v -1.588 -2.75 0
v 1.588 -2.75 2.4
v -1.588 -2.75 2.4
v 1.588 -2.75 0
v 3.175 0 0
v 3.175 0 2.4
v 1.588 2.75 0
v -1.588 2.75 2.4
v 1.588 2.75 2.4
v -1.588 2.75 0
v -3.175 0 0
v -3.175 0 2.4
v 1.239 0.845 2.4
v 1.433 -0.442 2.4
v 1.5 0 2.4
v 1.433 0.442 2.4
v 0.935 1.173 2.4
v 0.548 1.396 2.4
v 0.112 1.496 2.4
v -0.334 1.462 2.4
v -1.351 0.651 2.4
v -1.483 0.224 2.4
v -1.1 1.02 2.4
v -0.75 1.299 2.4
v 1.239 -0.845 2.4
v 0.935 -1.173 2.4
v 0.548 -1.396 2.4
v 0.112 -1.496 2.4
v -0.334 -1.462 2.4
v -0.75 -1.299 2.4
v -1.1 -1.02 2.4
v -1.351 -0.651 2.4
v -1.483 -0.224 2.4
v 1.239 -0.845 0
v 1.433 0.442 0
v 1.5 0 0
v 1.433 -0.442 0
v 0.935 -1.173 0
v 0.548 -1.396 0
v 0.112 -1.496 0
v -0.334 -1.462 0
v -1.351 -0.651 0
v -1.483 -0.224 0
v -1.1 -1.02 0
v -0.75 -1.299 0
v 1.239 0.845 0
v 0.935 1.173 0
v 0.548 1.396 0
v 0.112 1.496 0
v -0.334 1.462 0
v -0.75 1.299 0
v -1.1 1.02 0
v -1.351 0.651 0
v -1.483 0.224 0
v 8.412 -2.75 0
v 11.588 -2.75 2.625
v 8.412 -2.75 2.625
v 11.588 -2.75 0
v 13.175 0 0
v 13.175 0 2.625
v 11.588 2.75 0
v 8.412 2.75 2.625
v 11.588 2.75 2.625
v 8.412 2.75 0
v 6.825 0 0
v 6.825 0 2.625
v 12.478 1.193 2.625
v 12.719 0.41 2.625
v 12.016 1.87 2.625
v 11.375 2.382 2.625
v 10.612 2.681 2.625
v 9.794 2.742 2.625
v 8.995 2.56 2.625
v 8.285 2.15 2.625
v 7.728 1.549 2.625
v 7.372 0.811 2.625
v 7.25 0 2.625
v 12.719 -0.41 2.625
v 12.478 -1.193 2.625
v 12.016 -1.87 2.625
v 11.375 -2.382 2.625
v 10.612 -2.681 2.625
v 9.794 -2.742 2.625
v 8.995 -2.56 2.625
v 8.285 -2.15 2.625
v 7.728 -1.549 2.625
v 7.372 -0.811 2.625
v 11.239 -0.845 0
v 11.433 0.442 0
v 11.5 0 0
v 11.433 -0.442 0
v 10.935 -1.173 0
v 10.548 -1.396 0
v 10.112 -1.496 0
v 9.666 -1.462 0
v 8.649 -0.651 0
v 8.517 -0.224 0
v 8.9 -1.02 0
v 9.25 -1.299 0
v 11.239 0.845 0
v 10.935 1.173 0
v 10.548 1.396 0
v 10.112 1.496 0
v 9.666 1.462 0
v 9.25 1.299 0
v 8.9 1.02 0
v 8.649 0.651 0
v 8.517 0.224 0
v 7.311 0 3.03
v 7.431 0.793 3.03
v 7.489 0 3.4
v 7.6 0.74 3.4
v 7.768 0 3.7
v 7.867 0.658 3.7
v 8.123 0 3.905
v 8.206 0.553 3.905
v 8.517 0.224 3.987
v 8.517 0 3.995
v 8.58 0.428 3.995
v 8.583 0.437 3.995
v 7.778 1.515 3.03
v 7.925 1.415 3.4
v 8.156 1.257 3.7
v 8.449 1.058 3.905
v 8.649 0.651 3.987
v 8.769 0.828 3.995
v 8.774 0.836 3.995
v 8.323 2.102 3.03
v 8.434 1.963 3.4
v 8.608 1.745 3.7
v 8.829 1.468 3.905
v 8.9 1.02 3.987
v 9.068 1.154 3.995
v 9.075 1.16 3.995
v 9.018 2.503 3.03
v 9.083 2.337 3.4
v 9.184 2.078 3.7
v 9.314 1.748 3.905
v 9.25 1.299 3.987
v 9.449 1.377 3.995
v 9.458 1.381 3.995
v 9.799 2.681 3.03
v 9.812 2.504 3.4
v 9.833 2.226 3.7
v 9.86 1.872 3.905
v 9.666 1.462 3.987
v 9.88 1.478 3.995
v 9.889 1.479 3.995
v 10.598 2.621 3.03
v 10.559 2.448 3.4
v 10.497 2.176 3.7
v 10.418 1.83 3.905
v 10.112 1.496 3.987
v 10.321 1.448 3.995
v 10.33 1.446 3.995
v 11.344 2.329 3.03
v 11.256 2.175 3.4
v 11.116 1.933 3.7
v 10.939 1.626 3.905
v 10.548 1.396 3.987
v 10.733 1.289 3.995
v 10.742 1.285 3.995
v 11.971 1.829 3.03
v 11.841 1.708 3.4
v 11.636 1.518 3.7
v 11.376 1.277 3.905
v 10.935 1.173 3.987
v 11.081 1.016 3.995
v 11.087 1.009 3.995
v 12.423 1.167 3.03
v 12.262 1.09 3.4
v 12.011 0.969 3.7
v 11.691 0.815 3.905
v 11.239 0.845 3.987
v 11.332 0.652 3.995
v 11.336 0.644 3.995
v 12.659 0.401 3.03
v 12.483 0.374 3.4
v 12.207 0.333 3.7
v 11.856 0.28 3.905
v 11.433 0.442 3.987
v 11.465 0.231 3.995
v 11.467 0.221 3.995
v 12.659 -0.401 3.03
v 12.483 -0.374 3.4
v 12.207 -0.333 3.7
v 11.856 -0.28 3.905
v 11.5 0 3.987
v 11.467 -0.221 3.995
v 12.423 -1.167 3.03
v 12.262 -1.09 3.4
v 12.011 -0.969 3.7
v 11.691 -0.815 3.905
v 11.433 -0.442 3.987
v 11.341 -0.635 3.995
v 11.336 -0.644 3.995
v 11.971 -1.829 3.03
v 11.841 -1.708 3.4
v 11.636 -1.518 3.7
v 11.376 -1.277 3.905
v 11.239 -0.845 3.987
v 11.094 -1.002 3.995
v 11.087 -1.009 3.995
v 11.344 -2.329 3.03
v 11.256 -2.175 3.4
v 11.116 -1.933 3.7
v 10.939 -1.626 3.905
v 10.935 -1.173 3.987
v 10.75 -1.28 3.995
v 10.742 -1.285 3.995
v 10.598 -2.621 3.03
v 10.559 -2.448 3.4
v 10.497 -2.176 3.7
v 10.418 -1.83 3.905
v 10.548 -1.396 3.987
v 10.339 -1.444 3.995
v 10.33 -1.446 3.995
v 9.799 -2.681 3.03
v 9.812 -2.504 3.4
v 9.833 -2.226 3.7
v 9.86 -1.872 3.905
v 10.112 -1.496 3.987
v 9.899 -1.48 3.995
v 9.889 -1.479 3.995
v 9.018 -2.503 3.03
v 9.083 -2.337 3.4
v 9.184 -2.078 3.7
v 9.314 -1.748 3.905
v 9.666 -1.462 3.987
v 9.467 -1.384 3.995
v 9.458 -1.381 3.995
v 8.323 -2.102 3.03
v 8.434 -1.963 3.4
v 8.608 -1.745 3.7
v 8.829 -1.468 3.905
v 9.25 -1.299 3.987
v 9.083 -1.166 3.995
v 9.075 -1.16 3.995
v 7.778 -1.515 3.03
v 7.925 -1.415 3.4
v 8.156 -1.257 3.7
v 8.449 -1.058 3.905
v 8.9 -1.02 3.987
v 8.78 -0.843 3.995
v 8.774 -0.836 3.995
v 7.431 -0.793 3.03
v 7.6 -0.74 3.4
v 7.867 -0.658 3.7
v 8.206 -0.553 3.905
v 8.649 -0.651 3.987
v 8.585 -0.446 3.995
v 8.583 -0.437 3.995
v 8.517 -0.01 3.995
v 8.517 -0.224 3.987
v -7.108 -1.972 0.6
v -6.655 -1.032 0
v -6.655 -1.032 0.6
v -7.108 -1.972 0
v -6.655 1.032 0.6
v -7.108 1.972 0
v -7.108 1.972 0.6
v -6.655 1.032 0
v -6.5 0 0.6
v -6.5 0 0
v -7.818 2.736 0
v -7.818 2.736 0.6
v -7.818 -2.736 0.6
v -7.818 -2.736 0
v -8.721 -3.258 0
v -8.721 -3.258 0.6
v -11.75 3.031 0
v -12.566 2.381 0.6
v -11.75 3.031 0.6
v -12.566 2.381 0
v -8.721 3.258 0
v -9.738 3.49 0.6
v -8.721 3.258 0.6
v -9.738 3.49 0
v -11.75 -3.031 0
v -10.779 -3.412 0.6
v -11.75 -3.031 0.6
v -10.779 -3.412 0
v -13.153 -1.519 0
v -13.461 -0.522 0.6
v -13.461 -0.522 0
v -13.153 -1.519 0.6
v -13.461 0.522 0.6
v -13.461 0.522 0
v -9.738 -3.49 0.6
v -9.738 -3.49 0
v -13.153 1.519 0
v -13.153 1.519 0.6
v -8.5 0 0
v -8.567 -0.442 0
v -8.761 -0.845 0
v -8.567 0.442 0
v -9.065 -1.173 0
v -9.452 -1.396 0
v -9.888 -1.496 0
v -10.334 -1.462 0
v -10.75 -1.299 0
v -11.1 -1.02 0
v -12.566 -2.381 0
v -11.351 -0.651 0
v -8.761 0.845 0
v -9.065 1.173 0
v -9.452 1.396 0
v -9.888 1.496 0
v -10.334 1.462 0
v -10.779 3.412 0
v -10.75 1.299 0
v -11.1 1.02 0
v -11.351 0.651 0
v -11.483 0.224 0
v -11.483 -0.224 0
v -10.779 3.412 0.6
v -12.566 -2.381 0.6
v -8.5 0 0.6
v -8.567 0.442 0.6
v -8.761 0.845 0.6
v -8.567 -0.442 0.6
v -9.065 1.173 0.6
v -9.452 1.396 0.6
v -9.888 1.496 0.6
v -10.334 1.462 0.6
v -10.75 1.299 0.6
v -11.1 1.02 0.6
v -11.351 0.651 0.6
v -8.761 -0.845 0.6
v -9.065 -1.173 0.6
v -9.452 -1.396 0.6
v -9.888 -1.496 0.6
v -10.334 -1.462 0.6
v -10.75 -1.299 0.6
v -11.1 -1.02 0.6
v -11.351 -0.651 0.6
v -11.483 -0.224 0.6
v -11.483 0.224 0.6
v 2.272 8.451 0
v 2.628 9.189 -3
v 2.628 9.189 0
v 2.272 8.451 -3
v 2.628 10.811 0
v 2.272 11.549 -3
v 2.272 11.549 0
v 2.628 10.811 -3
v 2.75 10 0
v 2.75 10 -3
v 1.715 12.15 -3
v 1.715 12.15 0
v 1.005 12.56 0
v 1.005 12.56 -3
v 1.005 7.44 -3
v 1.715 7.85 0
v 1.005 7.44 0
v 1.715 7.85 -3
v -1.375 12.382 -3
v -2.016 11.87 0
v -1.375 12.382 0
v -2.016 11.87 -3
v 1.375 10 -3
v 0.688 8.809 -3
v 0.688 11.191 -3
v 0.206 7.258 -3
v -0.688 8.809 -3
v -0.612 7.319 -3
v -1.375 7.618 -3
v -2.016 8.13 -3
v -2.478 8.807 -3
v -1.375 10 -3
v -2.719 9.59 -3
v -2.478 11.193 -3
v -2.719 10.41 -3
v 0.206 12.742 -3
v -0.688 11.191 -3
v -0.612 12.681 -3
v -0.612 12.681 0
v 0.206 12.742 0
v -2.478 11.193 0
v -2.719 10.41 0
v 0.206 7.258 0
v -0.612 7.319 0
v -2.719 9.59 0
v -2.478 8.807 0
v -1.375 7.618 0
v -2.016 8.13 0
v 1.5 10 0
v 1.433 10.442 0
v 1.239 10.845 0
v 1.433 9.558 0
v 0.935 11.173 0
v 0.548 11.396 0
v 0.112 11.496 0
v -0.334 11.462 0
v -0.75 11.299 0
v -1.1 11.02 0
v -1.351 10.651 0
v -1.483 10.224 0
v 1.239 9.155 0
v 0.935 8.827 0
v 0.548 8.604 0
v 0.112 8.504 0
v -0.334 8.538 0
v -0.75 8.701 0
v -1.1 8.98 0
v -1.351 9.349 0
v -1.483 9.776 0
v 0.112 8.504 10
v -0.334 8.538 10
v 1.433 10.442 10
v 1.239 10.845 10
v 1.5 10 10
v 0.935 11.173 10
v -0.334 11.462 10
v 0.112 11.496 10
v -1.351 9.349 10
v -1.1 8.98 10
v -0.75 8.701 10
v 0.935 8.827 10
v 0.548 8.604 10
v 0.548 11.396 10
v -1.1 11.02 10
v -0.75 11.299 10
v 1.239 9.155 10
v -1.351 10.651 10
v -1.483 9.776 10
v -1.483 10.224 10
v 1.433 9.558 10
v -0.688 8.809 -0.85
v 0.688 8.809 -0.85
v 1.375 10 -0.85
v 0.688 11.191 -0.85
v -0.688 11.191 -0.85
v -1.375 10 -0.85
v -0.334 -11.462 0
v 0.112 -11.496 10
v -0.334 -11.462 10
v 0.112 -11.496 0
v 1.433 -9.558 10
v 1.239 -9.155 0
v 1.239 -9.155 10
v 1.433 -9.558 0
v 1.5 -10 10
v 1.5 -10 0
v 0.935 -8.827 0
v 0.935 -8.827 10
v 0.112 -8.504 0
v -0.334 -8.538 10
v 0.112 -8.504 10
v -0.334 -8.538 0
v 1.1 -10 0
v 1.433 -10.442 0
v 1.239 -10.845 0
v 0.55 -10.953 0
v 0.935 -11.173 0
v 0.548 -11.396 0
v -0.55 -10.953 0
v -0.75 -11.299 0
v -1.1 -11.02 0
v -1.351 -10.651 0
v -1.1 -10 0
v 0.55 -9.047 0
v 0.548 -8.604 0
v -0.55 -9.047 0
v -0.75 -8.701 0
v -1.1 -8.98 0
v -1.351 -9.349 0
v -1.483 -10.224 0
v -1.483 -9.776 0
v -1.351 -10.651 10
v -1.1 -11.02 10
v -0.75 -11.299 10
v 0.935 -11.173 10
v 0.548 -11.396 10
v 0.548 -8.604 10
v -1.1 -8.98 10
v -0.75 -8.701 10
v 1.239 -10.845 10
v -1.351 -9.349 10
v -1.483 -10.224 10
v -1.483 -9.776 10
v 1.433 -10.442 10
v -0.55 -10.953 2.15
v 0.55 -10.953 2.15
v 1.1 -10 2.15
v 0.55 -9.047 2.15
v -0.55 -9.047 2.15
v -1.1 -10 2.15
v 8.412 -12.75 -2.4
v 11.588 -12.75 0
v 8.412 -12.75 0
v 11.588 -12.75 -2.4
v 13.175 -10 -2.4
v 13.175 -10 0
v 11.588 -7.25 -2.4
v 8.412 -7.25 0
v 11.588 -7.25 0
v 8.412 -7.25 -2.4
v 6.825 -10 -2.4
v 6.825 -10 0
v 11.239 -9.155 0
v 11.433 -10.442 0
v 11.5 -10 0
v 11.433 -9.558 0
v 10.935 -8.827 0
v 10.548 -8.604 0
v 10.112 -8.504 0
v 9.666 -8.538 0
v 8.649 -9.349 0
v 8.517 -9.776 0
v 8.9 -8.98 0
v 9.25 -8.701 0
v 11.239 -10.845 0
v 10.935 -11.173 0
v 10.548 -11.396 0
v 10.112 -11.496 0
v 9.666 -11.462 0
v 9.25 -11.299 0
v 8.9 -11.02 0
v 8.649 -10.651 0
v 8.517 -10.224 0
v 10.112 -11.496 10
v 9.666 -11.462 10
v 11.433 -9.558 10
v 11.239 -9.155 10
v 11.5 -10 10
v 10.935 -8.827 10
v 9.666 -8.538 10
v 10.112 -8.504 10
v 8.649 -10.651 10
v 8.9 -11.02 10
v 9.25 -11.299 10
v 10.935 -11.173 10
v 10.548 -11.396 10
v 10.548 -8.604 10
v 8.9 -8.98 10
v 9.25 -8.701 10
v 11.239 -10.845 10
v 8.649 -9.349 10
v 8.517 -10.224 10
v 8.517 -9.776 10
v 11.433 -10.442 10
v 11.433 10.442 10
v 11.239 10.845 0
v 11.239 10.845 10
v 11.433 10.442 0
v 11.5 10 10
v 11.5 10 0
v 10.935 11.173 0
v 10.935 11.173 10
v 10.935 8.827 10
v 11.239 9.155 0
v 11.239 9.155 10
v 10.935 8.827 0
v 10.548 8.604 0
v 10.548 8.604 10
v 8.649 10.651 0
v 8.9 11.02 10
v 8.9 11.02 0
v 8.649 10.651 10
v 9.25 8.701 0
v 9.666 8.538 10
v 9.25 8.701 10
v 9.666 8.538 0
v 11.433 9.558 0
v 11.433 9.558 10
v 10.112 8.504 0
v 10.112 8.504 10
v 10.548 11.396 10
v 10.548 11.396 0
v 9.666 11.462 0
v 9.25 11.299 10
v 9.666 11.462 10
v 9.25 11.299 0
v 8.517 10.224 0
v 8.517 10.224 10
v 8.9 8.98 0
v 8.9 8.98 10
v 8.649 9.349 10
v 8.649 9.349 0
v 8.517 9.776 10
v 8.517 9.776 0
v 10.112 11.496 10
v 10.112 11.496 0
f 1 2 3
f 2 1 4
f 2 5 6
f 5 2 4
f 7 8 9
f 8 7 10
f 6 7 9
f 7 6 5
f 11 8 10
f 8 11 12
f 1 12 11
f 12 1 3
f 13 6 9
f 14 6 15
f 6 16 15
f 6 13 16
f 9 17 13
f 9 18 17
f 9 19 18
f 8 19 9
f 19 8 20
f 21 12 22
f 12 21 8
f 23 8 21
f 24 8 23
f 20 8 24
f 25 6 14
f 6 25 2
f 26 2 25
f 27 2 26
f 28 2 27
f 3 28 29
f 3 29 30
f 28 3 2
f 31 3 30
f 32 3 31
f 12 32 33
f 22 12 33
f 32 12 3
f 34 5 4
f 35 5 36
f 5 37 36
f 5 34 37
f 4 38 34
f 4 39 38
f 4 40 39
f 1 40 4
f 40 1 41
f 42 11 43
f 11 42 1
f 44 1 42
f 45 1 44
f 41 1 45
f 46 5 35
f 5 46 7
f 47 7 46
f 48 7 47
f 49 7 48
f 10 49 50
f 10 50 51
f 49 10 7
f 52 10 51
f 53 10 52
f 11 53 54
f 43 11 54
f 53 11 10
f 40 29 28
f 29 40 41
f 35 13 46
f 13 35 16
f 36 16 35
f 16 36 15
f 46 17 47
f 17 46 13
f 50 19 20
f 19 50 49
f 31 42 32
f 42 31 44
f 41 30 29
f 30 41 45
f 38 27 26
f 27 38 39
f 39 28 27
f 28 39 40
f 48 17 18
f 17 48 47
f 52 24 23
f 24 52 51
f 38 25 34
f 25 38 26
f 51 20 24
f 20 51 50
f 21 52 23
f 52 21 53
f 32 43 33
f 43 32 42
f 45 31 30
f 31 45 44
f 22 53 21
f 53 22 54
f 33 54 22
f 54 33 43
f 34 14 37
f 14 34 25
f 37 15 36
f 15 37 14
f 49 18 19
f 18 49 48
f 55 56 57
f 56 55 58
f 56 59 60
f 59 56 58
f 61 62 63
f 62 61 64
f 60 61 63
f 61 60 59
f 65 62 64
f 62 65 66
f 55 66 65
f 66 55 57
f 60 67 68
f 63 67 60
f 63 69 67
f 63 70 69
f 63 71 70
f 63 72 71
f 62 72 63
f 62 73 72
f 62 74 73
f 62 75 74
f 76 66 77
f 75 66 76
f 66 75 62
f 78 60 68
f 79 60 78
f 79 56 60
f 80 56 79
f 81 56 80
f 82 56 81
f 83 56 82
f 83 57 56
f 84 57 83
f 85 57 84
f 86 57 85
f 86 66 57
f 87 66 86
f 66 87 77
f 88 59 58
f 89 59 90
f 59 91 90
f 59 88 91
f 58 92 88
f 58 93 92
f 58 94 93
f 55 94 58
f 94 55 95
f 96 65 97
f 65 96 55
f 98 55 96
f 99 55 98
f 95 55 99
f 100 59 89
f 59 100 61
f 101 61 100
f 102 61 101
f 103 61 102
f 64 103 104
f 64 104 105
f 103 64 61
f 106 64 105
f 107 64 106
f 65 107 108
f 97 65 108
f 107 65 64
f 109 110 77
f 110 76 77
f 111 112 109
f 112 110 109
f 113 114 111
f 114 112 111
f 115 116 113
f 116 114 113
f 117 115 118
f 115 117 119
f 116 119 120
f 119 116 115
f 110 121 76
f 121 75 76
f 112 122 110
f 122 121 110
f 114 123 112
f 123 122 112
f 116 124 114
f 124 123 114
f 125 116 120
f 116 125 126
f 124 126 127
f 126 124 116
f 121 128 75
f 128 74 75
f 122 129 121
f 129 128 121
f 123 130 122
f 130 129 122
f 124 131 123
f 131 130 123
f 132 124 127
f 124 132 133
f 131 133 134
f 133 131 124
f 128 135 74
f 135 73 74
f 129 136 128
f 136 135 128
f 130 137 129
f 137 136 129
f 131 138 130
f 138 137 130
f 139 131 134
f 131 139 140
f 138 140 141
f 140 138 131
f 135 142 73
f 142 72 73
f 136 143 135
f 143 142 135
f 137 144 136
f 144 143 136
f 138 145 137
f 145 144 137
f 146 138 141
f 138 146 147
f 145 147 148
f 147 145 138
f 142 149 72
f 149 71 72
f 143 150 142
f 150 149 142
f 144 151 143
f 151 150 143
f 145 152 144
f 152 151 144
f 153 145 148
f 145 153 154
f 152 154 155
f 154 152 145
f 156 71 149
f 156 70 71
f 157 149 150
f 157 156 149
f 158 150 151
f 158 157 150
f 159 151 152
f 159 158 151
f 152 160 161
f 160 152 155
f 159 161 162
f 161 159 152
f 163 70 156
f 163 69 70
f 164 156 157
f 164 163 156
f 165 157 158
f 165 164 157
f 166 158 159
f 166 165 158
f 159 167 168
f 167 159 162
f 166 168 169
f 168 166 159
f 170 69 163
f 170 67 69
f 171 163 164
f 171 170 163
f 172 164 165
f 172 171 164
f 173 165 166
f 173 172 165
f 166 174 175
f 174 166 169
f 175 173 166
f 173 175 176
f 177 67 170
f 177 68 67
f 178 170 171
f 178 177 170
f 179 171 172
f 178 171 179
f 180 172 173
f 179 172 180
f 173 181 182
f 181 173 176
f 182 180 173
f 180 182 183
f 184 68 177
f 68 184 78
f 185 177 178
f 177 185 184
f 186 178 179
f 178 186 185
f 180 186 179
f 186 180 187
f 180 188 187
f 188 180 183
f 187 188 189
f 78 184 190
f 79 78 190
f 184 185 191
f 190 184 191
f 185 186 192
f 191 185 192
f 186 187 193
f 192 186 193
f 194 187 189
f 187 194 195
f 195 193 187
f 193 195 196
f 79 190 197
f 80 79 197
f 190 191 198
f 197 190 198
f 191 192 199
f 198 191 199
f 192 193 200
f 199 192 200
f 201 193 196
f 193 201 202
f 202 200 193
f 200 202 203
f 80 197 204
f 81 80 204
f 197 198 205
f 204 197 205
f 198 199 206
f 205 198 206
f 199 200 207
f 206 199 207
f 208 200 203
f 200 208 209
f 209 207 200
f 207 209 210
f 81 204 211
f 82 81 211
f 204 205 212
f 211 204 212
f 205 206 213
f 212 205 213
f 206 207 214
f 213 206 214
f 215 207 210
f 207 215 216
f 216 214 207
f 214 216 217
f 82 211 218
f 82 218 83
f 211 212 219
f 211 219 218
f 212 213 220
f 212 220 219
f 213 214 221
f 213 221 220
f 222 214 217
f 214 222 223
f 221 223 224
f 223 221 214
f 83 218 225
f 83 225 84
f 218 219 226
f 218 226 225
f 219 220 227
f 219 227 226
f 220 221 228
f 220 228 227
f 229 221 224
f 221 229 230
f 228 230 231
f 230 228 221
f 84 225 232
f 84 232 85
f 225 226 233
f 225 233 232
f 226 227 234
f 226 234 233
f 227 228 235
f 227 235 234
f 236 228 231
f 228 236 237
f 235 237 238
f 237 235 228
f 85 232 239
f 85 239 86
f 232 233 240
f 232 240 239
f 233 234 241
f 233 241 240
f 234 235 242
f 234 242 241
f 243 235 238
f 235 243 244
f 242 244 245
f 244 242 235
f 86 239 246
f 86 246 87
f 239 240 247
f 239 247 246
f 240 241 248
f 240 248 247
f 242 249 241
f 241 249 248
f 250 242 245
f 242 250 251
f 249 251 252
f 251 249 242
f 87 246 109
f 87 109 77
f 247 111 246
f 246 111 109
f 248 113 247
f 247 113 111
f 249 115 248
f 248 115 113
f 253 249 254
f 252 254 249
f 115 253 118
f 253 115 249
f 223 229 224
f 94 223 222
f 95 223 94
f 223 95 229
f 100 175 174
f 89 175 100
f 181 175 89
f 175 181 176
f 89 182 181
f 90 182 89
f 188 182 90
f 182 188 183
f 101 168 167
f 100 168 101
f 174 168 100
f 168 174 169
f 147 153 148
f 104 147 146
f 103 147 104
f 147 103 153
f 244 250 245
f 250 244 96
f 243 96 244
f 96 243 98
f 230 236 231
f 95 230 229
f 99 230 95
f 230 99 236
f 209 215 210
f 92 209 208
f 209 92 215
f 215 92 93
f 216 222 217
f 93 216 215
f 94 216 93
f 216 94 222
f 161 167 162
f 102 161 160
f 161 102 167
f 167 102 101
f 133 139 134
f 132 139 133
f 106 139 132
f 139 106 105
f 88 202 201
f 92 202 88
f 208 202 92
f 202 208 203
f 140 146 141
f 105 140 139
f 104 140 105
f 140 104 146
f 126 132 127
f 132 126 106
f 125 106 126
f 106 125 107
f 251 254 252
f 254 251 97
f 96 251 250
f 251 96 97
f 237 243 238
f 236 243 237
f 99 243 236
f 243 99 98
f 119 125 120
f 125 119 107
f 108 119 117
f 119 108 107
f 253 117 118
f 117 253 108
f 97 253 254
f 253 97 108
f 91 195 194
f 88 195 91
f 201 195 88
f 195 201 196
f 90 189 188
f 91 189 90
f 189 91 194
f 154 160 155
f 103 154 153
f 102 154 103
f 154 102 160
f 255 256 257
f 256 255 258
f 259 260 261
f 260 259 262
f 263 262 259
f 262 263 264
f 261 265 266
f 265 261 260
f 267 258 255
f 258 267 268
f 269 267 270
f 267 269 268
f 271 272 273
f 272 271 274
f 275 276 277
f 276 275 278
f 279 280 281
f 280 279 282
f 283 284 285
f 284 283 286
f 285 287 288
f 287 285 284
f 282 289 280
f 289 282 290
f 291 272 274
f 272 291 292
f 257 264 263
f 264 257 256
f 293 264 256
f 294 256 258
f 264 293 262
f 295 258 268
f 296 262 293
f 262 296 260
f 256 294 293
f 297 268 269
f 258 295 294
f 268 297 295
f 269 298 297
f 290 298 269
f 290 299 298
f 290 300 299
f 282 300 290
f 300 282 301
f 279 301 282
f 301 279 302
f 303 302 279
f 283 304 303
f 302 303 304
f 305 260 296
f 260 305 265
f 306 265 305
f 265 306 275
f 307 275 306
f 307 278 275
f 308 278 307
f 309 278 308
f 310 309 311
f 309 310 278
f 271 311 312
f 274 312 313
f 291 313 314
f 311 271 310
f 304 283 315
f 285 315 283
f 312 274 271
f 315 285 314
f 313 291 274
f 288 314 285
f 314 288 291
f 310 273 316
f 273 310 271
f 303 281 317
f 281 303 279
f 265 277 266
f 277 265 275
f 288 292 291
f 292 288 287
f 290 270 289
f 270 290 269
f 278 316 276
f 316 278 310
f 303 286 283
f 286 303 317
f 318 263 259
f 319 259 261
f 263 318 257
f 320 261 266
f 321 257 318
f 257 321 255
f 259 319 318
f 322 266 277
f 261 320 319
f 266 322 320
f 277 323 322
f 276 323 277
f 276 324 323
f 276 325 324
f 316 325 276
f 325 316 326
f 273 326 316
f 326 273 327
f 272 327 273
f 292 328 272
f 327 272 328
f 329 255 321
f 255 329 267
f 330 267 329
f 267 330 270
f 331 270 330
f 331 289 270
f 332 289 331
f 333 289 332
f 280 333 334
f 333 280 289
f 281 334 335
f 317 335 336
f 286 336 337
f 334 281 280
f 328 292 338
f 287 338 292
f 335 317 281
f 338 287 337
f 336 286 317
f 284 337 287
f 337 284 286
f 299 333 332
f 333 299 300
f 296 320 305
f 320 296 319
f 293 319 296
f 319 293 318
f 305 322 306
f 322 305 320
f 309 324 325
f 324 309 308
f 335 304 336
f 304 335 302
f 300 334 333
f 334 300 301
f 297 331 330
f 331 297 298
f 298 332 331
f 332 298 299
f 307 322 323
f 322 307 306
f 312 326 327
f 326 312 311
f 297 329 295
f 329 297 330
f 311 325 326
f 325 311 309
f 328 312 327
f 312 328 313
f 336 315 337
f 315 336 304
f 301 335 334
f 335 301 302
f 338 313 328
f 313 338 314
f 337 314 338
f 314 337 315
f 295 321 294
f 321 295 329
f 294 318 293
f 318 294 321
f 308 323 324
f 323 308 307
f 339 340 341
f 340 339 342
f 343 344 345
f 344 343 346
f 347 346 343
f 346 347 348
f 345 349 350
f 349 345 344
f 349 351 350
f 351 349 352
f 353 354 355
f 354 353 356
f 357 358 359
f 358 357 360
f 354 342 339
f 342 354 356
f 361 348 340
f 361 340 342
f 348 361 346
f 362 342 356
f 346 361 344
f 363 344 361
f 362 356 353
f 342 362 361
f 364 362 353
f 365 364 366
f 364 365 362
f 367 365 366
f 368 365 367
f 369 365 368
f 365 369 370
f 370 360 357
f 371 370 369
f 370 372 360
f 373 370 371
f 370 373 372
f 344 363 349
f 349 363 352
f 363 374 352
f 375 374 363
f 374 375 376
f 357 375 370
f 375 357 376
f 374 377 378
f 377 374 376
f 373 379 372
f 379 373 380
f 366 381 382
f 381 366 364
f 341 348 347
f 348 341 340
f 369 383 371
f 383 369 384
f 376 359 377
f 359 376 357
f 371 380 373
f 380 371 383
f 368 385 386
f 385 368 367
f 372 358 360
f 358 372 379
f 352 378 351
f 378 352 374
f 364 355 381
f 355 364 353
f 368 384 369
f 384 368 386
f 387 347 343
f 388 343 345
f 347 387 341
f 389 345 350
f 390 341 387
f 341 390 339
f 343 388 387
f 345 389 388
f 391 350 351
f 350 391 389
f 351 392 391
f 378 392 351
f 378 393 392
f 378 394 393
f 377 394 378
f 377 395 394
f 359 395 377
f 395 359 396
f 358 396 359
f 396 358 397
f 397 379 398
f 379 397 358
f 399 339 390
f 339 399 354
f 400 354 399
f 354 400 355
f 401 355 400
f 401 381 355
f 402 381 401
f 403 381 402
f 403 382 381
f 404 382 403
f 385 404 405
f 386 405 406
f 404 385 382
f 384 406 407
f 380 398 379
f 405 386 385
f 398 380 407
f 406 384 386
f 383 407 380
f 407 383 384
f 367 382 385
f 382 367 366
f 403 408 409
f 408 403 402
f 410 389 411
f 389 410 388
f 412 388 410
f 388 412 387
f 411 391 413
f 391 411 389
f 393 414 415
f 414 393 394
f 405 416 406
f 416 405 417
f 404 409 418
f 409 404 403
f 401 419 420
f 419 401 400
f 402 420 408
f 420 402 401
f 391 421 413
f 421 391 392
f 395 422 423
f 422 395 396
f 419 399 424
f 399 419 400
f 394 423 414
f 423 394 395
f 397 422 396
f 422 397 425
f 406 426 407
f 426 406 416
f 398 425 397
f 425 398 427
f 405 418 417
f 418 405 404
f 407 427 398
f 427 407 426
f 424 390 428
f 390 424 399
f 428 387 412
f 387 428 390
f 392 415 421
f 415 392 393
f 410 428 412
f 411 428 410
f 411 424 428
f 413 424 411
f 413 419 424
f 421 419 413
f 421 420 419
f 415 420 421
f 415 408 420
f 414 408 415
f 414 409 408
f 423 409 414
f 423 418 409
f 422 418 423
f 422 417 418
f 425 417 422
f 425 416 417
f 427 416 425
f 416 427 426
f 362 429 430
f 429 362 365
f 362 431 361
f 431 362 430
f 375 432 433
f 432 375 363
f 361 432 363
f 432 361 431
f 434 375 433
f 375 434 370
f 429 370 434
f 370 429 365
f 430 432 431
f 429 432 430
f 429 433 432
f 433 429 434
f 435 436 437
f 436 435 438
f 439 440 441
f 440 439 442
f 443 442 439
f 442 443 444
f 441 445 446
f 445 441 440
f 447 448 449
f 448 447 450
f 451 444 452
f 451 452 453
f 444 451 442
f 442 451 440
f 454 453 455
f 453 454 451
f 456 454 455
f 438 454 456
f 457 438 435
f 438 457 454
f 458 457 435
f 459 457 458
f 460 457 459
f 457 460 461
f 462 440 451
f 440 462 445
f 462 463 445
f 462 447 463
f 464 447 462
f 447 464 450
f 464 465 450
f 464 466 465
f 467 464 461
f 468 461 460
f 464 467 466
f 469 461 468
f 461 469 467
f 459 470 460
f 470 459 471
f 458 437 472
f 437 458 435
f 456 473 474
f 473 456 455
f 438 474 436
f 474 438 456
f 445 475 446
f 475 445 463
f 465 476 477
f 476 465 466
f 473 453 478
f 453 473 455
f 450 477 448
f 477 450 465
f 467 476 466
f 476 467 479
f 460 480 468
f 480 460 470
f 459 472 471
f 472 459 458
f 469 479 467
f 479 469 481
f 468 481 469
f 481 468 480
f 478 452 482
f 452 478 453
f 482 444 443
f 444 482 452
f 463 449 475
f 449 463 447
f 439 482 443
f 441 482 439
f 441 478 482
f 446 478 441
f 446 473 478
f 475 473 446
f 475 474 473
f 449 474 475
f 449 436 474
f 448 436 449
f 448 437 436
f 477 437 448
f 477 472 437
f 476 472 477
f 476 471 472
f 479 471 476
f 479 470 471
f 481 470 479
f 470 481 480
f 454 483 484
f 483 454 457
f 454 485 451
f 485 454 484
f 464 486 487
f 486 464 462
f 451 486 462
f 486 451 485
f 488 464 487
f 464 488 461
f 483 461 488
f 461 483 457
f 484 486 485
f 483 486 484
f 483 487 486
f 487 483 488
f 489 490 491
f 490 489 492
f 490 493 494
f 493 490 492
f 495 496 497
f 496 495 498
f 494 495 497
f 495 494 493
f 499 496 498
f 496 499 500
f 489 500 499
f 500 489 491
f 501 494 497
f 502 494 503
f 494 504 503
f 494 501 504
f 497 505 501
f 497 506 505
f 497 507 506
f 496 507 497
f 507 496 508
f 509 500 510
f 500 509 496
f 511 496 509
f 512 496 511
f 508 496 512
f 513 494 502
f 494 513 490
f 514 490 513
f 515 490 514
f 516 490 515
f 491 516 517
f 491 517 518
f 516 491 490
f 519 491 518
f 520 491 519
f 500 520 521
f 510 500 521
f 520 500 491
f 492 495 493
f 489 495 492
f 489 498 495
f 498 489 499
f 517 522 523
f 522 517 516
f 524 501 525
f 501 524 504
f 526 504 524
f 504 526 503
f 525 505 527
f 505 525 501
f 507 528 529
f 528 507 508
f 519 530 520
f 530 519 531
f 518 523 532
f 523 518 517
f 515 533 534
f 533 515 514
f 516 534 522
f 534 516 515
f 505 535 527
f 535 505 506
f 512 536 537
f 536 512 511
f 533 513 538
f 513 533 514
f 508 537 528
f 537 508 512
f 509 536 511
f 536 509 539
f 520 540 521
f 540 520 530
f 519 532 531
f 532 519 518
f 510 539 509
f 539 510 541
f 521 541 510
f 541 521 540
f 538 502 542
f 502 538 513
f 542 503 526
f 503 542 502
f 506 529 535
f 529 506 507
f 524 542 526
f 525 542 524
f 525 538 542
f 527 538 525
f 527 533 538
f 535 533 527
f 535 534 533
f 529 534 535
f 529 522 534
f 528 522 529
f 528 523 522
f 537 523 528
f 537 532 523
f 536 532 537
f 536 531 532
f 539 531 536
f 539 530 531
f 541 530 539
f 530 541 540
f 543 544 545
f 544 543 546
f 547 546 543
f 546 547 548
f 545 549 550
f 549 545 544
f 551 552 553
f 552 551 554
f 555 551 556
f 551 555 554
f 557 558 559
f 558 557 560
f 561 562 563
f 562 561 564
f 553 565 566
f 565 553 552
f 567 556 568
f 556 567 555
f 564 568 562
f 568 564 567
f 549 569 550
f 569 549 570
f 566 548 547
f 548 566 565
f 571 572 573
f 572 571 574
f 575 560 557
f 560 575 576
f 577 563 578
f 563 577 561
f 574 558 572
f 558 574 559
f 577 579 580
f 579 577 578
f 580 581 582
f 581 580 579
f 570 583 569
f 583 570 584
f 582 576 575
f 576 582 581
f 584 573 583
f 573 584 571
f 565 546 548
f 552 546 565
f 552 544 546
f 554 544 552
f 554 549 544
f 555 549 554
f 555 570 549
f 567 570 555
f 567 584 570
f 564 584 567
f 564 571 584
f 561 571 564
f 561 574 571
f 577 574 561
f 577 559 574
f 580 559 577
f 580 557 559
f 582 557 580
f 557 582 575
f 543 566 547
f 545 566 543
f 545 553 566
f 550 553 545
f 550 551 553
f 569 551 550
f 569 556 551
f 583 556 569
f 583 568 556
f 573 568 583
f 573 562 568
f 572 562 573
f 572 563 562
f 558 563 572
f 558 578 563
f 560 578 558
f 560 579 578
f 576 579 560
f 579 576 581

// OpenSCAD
// file: ../scad/materials.scad
module aluminium(){
	color([1,1,1]*0.95) for(i=[1:$children]) child(i-1);
}
module aluminum(){
	color([1,1,1]*0.95) for(i=[1:$children]) child(i-1);
}
module bzp(){
    color([0.7,0.7,1]) for(i=[1:$children]) child(i-1);
}
module stainless(){
    color([1,1,1]*0.6) for(i=[1:$children]) child(i-1);
}
module steel(){
    color([1,1,1]*0.5) for(i=[1:$children]) child(i-1);
}
module urethane(){
    color([166/255,119/255,73/255]) for(i=[1:$children]) child(i-1);
}
// file: ../scad/functions.scad
include <hardware_dims.scad>

// Assign Screw array
function getScrewDims(screw) = (screw=="M2") ? m2 : (screw=="M2.5") ? m2_5 : (screw=="M3") ? m3 : (screw=="M4") ? m4 : (screw=="M5") ? m5 : (screw=="M6") ? m6 : (screw=="M8") ? m8 : "error";

function get_screw_dims(screw) = getScrewDims(screw);

function getStepperDims(motor) = (motor=="NEMA8") ? nema8 : (motor=="NEMA11") ? nema11 : (motor=="NEMA14") ? nema14 : (motor=="NEMA17") ? nema17 : (motor=="Pololu 35x26") ? pololu35x26 :"error";

function get_stepper_dims(motor) = getStepperDims(motor);

function getElectronicsHoles(electronics) = (electronics=="Melzi") ? melzi : (electronics=="Mega") ? mega : (electronics=="Printrboard") ? printrboard : (electronics=="Sanguinololu") ? sanguinololu :"error";

function get_electronics_holes(electronics) = getElectronicsHoles(electronics);

function getExtruderGearDims(extruderGear) = (extruderGear=="Arcol8x5") ? arcol8x5 : (extruderGear=="Arcol11x8") ? arcol11x8 : (extruderGear=="Arcol11x5") ? arcol11x5 : (extruderGear=="Arcol13x8") ? arcol13x8 : "error";

function get_extruder_gear_dims(extruderGear) = getExtruderGearDims(extruderGear);

function get_drive_roller_dims(roller) = (roller == "A_7T_5MUR1405") ? A_7T_5MUR1405 : (roller == "A_7T_5MUR1606") ? A_7T_5MUR1606 : (roller == "A_7T_5MUR1905") ? A_7T_5MUR1905 : (roller == "A_7T_5MUR1906") ? A_7T_5MUR1906 : (roller == "A_7T_5MUR2206") ? A_7T_5MUR2206 : (roller == "A_7T_5MUR2510") ? A_7T_5MUR2510 : (roller == "A_7T_5MUR3210") ? A_7T_5MUR3210 : (roller == "A_7T_5MUR3810") ? A_7T_5MUR3810 : (roller == "A_7T_5MUR3812") ? A_7T_5MUR3812 : (roller == "A_7T_5MUR4412") ? A_7T_5MUR4412 : (roller == "A_7T_5MUR5012") ? A_7T_5MUR5012 : (roller == "A_7M_5MUR1206A") ? A_7M_5MUR1206A : (roller == "A_7M_5MUR1206B") ? A_7M_5MUR1206B : "error";
// file: ../scad/hardware_dims.scad
//Screw Dimension arrays
//[Diameter, Cap Head Height, Head Diameter, nut across flats, lock nut height, nut height, washer od, washer thick, pan head diameter]
m2 = [2, 2, 3.8, 4, 2.8, 1.6, 5, 0.3, 4];
m2_5 = [2.5, 2.5, 4.5, 5, 3.8, 2, 6, 0.5, 5];
m3 = [3, 3, 5.5, 5.5, 4, 2.4, 7, 0.6, 6];
m4 = [4, 4, 7, 7, 5, 3.2, 9, 0.9, 8];
m5 = [5, 5, 8.5, 8, 5, 4, 10, 1.1, 10];
m6 = [6, 6, 10, 10, 6, 5, 12.5, 1.8, 12];
m8 = [8, 8, 13, 13, 8, 6.5, 17, 1.8, 16];

//stepper dimension arrays
//[width, length, hole spacing, hole diameter, flange diameter, flange height, shaft length, shaft diameter]
nema8 = [20.3, 30, 16, 2, 15, 1.5, 14, 4];
nema11 = [28.1, 27, 23, 2.5, 21, 2, 20, 5];
nema14 = [35.2, 36, 26, 3, 22, 2, 21, 5];
nema17 = [42.3, 48, 31, 3, 22, 2, 23, 5];
pololu35x26 = [35.2, 26, 26, 3, 22, 2, 21, 5];

//electronics dimension arrays
//[[x,y,z],etc..]
melzi = [[0,0,0],[200,0,0],[0,42,0],[200,42,0]];
mega = [[0,0,0],[80,0,0],[1.3,48.3,0],[76.2,48.3,0]];//TODO: second entry needs fixing
printrboard = [[0,0,0],[91,0,0],[0,52.75,0],[91,52.75,0]];
sanguinololu = [[0,0,0],[94,0,0],[0,44,0],[94,44,0]];

//extruder drive gear dimensions arrays
//[outer diameter, length, inner diameter, hobb diameter, teeth diameter(torus inside to inside), teeth offset(from bottom)]
arcol8x5 = [8,13,5,5,6,5];
arcol11x5 = [11.1,13,5,5,9.1,6];
arcol11x8 = [11.1,13,8,5,9.1,6];
arcol13x8 = [13.3,13,8,5,11.3,6];


//Feed roller with hub 
// [Outside dia, bore, face width, hub projection, hub diameter]
A_7T_5MUR1405 = [14,5,6.35,6.35,11.1];
A_7T_5MUR1606 = [16,6,9.52,6.35,12.7];
A_7T_5MUR1905 = [19,5,6.35,6.35,11.1];
A_7T_5MUR1906 = [19,6,9.52,6.35,12.7];
A_7T_5MUR2206 = [22,6,9.52,6.35,12.7];
A_7T_5MUR2510 = [25,10,9.52,9.52,19];
A_7T_5MUR3210 = [32,10,9.52,9.52,20.62];
A_7T_5MUR3810 = [38,10,9.52,9.52,25.4];
A_7T_5MUR3812 = [38,12,12.7,12.7,25.4];
A_7T_5MUR4412 = [44,12,12.7,12.7,31.75];
A_7T_5MUR5012 = [50,12,12.7,12.7,34.9];

//hubless feed roller
// [outside dia, bore, face width, 0(use same constructor as above), sleeve diameter]
A_7M_5MUR1206A = [12, 6, 6.35, 0, 8.74];
A_7M_5MUR1206B = [12, 6, 18.2, 0, 8.74];
A_7M_5MUR1206C = [12, 6, 12.7, 0, 8.74];
A_7M_5MUR1710 = [17, 10, 6.35, 0, 12.7];
A_7M_5MUR1910 = [19, 10, 12.7, 0, 12.7];
A_7M_5MUR2010 = [20, 10, 12.7, 0, 12.7];
A_7M_5MUR2310 = [23, 10, 12.3, 0, 17.47];
A_7M_5MUR2810A = [28, 10, 11.12, 0, 12.7];
A_7M_5MUR2810B = [28, 10, 17.47, 0, 12.7];
A_7M_5MUR5010 = [50, 10, 17.47, 0, 34.92];
A_7M_5MUR5012A = [50, 12, 19.05, 0, 34.92];	
A_7M_5MUR5012B = [50, 12, 25.4, 0, 34.92];
// file: ../scad/constants.scad
//array positions
//screw
DIAMETER = 0;
CAP_HEAD_HEIGHT = 1;
CAP_HEAD_DIAMETER = 2;
NUT_WIDTH = 3;
LOCK_NUT_HEIGHT = 4;
NUT_HEIGHT = 5;
WASHER_OD = 6;
WASHER_HEIGHT = 7;
PAN_HEAD_DIAMETER = 8;
PAN_HEAD_HEIGHT = 5; //generally within 0.1mm of a nut height, so just use that

//stepper
WIDTH = 0;
LENGTH = 1;
HOLE_SPACING = 2;
HOLE_DIAMETER = 3;
FLANGE_DIAMETER = 4;
FLANGE_HEIGHT = 5;
SHAFT_LENGTH = 6;
SHAFT_DIAMETER = 7;

//extruder drive gear
OUTER_DIAMETER = 0;
INNER_DIAMETER = 0;
HOBB_DIAMETER = 0;
TEETH_DIAMETER = 0;
TEETH_OFFSET = 0;

//Feed Rollers
OUTSIDE_DIAMETER = 0;
BORE_SIZE = 1;
FACE_WIDTH = 2;
HUB_PROJECTION = 3;
HUB_DIAMETER = 4;

//constants
pi = 3.14159;
phi = 1.618;
eta = 0.1; //used to eliminate coincident faces
MAGPIE_OUT = "MAGPIE: ";
// file: ../scad/components.scad
include <hardware_dims.scad>
include <polyholes.scad>
include <constants.scad>
include <functions.scad>
include <materials.scad>

$fn = 21;

module nut(type){
	a = getScrewDims(type);

	difference(type){
		union(){
			stainless()cylinder(r = a[NUT_WIDTH]/cos(30)/2, h = a[NUT_HEIGHT], $fn = 6);
		}
		stainless()translate([0,0,-eta])cylinder(r = a[DIAMETER]/2, h = a[NUT_HEIGHT] + eta * 2);
	}
	echo(str(MAGPIE_OUT, type," nut")); 
}

module lockNut(type){
	a = getScrewDims(type);

	difference(){
		union(){
			stainless()cylinder(r = a[NUT_WIDTH]/cos(30)/2, h = a[LOCK_NUT_HEIGHT]-a[NUT_WIDTH]/4, $fn = 6);
			stainless()translate([0,0,a[LOCK_NUT_HEIGHT]-a[NUT_WIDTH]/4])
				rotate_extrude(convexity = 10)translate([a[NUT_WIDTH]/4,0,0])circle(r = a[NUT_WIDTH]/4);
		}
		stainless()translate([0,0,-eta])cylinder(r=a[DIAMETER]/2, h = a[LOCK_NUT_HEIGHT] + eta*2);
	}
	echo(str(MAGPIE_OUT, type," lock nut")); 
}

module lock_nut(type){
	lockNut(type);
}

module stepper(type){
	a = getStepperDims(type);

		union(){
			steel()translate([0,0,a[LENGTH]/2])cube([a[WIDTH], a[WIDTH], a[LENGTH]], center = true);
			steel()translate([0,0,a[LENGTH]])cylinder(r=a[FLANGE_DIAMETER]/2, h = a[FLANGE_HEIGHT]);
			stainless()translate([0,0,a[LENGTH]+a[FLANGE_HEIGHT]])cylinder(r=a[SHAFT_DIAMETER]/2, h = a[SHAFT_LENGTH]);
		}
	echo(str(MAGPIE_OUT, type," stepper")); 
}

module capScrew(type,length){
	a = getScrewDims(type);

	difference(){
		union(){
			steel()translate([0,0,-a[CAP_HEAD_HEIGHT]])
				cylinder(r = a[CAP_HEAD_DIAMETER]/2, h = a[CAP_HEAD_HEIGHT]);
			steel()cylinder(r = a[DIAMETER]/2, h = round(length));
			
		}
		//make a socket for aesthetics
		steel()translate([0,0,-a[CAP_HEAD_HEIGHT]-eta])
			cylinder(r = a[CAP_HEAD_DIAMETER]/4, h = a[CAP_HEAD_HEIGHT] * 3/4, $fn = 6);
	}
	echo(str(MAGPIE_OUT, type, "x", round(length), " cap screw")); 
}

module cap_screw(type, length){
	capScrew(type,length);
}

module hexScrew(type,length){
	a = getScrewDims(type);

	union(){
		steel()translate([0,0,-a[NUT_HEIGHT]])
			cylinder(r = a[NUT_WIDTH]/cos(30)/2, h = a[NUT_HEIGHT], $fn = 6);
		steel()cylinder(r = a[DIAMETER]/2, h = round(length));
		
	}

	echo(str(MAGPIE_OUT, type, "x", round(length), " hex screw")); 
}

module hex_screw(type, length){
	hexScrew(type,length);
}

module setScrew(type,length){
	a = getScrewDims(type);

	difference(){
		union(){
			steel()cylinder(r = a[DIAMETER]/2, h = round(length));
		}
		//make a socket for aesthetics
		steel()translate([0,0,-eta])
			cylinder(r = a[CAP_HEAD_DIAMETER]/5, h = a[CAP_HEAD_HEIGHT] * 3/4, $fn = 6);
	}
	echo(str(MAGPIE_OUT, type, "x", round(length), " set screw")); 
}

module set_screw(type, length){
	setScrew(type,length);
}

module flatWasher(type){
	a = getScrewDims(type);

	difference(){
		union(){
			stainless()cylinder(r = a[WASHER_OD]/2, h = a[WASHER_HEIGHT]);
		}
		stainless()translate([0,0,-eta])cylinder(r = a[DIAMETER]/2, h = a[WASHER_HEIGHT] + eta * 2);
	}
	echo(str(MAGPIE_OUT, type," flat washer")); 
}

module flat_washer(type){
	flatWasher(type);
}

module allThread(type, length){
	a = getScrewDims(type);

	//don't round up on all thread
	difference(){
		union(){
			steel()cylinder(r = a[DIAMETER]/2, h = round(length));
		}
	}
	echo(str(MAGPIE_OUT, type, "x", round(length), " threaded rod")); 
}

module all_thread(type,length){
	allThread(type,length);
}

module extruderGear(type){
	lextruder_gear_array = get_extruder_gear_dims(type);

	
	lextruder_gear_od = lextruder_gear_array[0];
	lextruder_gear_id = lextruder_gear_array[1];
	lextruder_gear_hobb_diameter = lextruder_gear_array[2];
	lextruder_gear_teeth_diameter = lextruder_gear_array[3];
	lextruder_gear_teeth_offset = lextruder_gear_array[4];
	lextruder_gear_height = lextruder_gear_array[5];

	color("silver")difference(){
		color("silver")union(){
			translate([0,0,-lextruder_gear_teeth_offset])cylinder(r=lextruder_gear_od/2, h=lextruder_gear_height);
		}
		translate([0,0,-eta-lextruder_gear_teeth_offset])cylinder(r=lextruder_gear_id/2, h=lextruder_gear_height+eta*2);
		rotate_extrude(convexity = 10)translate([lextruder_gear_hobb_diameter/2+lextruder_gear_teeth_diameter/2,0,0])circle(r = lextruder_gear_teeth_diameter/2);
	}
	echo(str(MAGPIE_OUT, type, " hobbed extruder drive gear")); 
}

module ptfeRod(radius,length){
	difference(){
		union(){
			color("white")cylinder(r = radius, h = round(length));
		}
	}
	echo(str(MAGPIE_OUT,radius*2,"mm diameter ", round(length), "mm long PTFE rod")); 
}

module ptfe_rod(radius, length){
	ptfeRod(radius, length);
}
// file: ../scad/polyholes.scad
//
// Mendel90
//
// GNU GPL v2
// nop.head@gmail.com
// hydraraptor.blogspot.com
//
// See http://hydraraptor.blogspot.com/2011/02/polyholes.html
//
function sides(r) = max(round(4 *r),3);
function correctedRadius(r,n) = 0.1 + r / cos(180 / n);
function correctedDiameter(d) = 0.2 + d / cos(180 / sides(d / 2));

module polyCircle(r, center = false) {
    n = sides(r);
    circle(r = correctedRadius(r,n), $fn = n, center = center);
}

module poly_circle(r, center = false) {
	polyCircle(r, center);
}

module polyCylinder(r, h, center = false) {
    n = sides(r);
    cylinder(h = h, r = correctedRadius(r,n), $fn = n, center = center);
}

module poly_cylinder(r, h, center = false) {
	polyCylinder(r,h,center);
}

module polydCylinder(r, center = false) {
    n = sides(r);
    r = correctedRadius(r,n);
    cylinder(h = h, r = r, $fn = n, center = center);
    translate([0, -r, 0])
        cube([r, 2 * r, h]);
}

module poly_d_cylinder(r, center = false) {
	polydCylinder(r,center);
}
// file: ../magpie.scad
//Use all the things
use <./scad/polyholes.scad>
use <./scad/components.scad>
include <./scad/constants.scad>
include <./scad/hardware_dims.scad>
include <./scad/functions.scad>
// main file
include <../magpie.scad>

//m3 tests
a = "M3";
nut(a);
translate([10,0,0])lockNut(a);
translate([-10,0,0])flatWasher(a);
translate([0,10,0])capScrew(a,10);
translate([0,-10,0])setScrew(a,10);
translate([10,10,0])allThread(a,10);
translate([10,-10,0])hexScrew(a,10);
